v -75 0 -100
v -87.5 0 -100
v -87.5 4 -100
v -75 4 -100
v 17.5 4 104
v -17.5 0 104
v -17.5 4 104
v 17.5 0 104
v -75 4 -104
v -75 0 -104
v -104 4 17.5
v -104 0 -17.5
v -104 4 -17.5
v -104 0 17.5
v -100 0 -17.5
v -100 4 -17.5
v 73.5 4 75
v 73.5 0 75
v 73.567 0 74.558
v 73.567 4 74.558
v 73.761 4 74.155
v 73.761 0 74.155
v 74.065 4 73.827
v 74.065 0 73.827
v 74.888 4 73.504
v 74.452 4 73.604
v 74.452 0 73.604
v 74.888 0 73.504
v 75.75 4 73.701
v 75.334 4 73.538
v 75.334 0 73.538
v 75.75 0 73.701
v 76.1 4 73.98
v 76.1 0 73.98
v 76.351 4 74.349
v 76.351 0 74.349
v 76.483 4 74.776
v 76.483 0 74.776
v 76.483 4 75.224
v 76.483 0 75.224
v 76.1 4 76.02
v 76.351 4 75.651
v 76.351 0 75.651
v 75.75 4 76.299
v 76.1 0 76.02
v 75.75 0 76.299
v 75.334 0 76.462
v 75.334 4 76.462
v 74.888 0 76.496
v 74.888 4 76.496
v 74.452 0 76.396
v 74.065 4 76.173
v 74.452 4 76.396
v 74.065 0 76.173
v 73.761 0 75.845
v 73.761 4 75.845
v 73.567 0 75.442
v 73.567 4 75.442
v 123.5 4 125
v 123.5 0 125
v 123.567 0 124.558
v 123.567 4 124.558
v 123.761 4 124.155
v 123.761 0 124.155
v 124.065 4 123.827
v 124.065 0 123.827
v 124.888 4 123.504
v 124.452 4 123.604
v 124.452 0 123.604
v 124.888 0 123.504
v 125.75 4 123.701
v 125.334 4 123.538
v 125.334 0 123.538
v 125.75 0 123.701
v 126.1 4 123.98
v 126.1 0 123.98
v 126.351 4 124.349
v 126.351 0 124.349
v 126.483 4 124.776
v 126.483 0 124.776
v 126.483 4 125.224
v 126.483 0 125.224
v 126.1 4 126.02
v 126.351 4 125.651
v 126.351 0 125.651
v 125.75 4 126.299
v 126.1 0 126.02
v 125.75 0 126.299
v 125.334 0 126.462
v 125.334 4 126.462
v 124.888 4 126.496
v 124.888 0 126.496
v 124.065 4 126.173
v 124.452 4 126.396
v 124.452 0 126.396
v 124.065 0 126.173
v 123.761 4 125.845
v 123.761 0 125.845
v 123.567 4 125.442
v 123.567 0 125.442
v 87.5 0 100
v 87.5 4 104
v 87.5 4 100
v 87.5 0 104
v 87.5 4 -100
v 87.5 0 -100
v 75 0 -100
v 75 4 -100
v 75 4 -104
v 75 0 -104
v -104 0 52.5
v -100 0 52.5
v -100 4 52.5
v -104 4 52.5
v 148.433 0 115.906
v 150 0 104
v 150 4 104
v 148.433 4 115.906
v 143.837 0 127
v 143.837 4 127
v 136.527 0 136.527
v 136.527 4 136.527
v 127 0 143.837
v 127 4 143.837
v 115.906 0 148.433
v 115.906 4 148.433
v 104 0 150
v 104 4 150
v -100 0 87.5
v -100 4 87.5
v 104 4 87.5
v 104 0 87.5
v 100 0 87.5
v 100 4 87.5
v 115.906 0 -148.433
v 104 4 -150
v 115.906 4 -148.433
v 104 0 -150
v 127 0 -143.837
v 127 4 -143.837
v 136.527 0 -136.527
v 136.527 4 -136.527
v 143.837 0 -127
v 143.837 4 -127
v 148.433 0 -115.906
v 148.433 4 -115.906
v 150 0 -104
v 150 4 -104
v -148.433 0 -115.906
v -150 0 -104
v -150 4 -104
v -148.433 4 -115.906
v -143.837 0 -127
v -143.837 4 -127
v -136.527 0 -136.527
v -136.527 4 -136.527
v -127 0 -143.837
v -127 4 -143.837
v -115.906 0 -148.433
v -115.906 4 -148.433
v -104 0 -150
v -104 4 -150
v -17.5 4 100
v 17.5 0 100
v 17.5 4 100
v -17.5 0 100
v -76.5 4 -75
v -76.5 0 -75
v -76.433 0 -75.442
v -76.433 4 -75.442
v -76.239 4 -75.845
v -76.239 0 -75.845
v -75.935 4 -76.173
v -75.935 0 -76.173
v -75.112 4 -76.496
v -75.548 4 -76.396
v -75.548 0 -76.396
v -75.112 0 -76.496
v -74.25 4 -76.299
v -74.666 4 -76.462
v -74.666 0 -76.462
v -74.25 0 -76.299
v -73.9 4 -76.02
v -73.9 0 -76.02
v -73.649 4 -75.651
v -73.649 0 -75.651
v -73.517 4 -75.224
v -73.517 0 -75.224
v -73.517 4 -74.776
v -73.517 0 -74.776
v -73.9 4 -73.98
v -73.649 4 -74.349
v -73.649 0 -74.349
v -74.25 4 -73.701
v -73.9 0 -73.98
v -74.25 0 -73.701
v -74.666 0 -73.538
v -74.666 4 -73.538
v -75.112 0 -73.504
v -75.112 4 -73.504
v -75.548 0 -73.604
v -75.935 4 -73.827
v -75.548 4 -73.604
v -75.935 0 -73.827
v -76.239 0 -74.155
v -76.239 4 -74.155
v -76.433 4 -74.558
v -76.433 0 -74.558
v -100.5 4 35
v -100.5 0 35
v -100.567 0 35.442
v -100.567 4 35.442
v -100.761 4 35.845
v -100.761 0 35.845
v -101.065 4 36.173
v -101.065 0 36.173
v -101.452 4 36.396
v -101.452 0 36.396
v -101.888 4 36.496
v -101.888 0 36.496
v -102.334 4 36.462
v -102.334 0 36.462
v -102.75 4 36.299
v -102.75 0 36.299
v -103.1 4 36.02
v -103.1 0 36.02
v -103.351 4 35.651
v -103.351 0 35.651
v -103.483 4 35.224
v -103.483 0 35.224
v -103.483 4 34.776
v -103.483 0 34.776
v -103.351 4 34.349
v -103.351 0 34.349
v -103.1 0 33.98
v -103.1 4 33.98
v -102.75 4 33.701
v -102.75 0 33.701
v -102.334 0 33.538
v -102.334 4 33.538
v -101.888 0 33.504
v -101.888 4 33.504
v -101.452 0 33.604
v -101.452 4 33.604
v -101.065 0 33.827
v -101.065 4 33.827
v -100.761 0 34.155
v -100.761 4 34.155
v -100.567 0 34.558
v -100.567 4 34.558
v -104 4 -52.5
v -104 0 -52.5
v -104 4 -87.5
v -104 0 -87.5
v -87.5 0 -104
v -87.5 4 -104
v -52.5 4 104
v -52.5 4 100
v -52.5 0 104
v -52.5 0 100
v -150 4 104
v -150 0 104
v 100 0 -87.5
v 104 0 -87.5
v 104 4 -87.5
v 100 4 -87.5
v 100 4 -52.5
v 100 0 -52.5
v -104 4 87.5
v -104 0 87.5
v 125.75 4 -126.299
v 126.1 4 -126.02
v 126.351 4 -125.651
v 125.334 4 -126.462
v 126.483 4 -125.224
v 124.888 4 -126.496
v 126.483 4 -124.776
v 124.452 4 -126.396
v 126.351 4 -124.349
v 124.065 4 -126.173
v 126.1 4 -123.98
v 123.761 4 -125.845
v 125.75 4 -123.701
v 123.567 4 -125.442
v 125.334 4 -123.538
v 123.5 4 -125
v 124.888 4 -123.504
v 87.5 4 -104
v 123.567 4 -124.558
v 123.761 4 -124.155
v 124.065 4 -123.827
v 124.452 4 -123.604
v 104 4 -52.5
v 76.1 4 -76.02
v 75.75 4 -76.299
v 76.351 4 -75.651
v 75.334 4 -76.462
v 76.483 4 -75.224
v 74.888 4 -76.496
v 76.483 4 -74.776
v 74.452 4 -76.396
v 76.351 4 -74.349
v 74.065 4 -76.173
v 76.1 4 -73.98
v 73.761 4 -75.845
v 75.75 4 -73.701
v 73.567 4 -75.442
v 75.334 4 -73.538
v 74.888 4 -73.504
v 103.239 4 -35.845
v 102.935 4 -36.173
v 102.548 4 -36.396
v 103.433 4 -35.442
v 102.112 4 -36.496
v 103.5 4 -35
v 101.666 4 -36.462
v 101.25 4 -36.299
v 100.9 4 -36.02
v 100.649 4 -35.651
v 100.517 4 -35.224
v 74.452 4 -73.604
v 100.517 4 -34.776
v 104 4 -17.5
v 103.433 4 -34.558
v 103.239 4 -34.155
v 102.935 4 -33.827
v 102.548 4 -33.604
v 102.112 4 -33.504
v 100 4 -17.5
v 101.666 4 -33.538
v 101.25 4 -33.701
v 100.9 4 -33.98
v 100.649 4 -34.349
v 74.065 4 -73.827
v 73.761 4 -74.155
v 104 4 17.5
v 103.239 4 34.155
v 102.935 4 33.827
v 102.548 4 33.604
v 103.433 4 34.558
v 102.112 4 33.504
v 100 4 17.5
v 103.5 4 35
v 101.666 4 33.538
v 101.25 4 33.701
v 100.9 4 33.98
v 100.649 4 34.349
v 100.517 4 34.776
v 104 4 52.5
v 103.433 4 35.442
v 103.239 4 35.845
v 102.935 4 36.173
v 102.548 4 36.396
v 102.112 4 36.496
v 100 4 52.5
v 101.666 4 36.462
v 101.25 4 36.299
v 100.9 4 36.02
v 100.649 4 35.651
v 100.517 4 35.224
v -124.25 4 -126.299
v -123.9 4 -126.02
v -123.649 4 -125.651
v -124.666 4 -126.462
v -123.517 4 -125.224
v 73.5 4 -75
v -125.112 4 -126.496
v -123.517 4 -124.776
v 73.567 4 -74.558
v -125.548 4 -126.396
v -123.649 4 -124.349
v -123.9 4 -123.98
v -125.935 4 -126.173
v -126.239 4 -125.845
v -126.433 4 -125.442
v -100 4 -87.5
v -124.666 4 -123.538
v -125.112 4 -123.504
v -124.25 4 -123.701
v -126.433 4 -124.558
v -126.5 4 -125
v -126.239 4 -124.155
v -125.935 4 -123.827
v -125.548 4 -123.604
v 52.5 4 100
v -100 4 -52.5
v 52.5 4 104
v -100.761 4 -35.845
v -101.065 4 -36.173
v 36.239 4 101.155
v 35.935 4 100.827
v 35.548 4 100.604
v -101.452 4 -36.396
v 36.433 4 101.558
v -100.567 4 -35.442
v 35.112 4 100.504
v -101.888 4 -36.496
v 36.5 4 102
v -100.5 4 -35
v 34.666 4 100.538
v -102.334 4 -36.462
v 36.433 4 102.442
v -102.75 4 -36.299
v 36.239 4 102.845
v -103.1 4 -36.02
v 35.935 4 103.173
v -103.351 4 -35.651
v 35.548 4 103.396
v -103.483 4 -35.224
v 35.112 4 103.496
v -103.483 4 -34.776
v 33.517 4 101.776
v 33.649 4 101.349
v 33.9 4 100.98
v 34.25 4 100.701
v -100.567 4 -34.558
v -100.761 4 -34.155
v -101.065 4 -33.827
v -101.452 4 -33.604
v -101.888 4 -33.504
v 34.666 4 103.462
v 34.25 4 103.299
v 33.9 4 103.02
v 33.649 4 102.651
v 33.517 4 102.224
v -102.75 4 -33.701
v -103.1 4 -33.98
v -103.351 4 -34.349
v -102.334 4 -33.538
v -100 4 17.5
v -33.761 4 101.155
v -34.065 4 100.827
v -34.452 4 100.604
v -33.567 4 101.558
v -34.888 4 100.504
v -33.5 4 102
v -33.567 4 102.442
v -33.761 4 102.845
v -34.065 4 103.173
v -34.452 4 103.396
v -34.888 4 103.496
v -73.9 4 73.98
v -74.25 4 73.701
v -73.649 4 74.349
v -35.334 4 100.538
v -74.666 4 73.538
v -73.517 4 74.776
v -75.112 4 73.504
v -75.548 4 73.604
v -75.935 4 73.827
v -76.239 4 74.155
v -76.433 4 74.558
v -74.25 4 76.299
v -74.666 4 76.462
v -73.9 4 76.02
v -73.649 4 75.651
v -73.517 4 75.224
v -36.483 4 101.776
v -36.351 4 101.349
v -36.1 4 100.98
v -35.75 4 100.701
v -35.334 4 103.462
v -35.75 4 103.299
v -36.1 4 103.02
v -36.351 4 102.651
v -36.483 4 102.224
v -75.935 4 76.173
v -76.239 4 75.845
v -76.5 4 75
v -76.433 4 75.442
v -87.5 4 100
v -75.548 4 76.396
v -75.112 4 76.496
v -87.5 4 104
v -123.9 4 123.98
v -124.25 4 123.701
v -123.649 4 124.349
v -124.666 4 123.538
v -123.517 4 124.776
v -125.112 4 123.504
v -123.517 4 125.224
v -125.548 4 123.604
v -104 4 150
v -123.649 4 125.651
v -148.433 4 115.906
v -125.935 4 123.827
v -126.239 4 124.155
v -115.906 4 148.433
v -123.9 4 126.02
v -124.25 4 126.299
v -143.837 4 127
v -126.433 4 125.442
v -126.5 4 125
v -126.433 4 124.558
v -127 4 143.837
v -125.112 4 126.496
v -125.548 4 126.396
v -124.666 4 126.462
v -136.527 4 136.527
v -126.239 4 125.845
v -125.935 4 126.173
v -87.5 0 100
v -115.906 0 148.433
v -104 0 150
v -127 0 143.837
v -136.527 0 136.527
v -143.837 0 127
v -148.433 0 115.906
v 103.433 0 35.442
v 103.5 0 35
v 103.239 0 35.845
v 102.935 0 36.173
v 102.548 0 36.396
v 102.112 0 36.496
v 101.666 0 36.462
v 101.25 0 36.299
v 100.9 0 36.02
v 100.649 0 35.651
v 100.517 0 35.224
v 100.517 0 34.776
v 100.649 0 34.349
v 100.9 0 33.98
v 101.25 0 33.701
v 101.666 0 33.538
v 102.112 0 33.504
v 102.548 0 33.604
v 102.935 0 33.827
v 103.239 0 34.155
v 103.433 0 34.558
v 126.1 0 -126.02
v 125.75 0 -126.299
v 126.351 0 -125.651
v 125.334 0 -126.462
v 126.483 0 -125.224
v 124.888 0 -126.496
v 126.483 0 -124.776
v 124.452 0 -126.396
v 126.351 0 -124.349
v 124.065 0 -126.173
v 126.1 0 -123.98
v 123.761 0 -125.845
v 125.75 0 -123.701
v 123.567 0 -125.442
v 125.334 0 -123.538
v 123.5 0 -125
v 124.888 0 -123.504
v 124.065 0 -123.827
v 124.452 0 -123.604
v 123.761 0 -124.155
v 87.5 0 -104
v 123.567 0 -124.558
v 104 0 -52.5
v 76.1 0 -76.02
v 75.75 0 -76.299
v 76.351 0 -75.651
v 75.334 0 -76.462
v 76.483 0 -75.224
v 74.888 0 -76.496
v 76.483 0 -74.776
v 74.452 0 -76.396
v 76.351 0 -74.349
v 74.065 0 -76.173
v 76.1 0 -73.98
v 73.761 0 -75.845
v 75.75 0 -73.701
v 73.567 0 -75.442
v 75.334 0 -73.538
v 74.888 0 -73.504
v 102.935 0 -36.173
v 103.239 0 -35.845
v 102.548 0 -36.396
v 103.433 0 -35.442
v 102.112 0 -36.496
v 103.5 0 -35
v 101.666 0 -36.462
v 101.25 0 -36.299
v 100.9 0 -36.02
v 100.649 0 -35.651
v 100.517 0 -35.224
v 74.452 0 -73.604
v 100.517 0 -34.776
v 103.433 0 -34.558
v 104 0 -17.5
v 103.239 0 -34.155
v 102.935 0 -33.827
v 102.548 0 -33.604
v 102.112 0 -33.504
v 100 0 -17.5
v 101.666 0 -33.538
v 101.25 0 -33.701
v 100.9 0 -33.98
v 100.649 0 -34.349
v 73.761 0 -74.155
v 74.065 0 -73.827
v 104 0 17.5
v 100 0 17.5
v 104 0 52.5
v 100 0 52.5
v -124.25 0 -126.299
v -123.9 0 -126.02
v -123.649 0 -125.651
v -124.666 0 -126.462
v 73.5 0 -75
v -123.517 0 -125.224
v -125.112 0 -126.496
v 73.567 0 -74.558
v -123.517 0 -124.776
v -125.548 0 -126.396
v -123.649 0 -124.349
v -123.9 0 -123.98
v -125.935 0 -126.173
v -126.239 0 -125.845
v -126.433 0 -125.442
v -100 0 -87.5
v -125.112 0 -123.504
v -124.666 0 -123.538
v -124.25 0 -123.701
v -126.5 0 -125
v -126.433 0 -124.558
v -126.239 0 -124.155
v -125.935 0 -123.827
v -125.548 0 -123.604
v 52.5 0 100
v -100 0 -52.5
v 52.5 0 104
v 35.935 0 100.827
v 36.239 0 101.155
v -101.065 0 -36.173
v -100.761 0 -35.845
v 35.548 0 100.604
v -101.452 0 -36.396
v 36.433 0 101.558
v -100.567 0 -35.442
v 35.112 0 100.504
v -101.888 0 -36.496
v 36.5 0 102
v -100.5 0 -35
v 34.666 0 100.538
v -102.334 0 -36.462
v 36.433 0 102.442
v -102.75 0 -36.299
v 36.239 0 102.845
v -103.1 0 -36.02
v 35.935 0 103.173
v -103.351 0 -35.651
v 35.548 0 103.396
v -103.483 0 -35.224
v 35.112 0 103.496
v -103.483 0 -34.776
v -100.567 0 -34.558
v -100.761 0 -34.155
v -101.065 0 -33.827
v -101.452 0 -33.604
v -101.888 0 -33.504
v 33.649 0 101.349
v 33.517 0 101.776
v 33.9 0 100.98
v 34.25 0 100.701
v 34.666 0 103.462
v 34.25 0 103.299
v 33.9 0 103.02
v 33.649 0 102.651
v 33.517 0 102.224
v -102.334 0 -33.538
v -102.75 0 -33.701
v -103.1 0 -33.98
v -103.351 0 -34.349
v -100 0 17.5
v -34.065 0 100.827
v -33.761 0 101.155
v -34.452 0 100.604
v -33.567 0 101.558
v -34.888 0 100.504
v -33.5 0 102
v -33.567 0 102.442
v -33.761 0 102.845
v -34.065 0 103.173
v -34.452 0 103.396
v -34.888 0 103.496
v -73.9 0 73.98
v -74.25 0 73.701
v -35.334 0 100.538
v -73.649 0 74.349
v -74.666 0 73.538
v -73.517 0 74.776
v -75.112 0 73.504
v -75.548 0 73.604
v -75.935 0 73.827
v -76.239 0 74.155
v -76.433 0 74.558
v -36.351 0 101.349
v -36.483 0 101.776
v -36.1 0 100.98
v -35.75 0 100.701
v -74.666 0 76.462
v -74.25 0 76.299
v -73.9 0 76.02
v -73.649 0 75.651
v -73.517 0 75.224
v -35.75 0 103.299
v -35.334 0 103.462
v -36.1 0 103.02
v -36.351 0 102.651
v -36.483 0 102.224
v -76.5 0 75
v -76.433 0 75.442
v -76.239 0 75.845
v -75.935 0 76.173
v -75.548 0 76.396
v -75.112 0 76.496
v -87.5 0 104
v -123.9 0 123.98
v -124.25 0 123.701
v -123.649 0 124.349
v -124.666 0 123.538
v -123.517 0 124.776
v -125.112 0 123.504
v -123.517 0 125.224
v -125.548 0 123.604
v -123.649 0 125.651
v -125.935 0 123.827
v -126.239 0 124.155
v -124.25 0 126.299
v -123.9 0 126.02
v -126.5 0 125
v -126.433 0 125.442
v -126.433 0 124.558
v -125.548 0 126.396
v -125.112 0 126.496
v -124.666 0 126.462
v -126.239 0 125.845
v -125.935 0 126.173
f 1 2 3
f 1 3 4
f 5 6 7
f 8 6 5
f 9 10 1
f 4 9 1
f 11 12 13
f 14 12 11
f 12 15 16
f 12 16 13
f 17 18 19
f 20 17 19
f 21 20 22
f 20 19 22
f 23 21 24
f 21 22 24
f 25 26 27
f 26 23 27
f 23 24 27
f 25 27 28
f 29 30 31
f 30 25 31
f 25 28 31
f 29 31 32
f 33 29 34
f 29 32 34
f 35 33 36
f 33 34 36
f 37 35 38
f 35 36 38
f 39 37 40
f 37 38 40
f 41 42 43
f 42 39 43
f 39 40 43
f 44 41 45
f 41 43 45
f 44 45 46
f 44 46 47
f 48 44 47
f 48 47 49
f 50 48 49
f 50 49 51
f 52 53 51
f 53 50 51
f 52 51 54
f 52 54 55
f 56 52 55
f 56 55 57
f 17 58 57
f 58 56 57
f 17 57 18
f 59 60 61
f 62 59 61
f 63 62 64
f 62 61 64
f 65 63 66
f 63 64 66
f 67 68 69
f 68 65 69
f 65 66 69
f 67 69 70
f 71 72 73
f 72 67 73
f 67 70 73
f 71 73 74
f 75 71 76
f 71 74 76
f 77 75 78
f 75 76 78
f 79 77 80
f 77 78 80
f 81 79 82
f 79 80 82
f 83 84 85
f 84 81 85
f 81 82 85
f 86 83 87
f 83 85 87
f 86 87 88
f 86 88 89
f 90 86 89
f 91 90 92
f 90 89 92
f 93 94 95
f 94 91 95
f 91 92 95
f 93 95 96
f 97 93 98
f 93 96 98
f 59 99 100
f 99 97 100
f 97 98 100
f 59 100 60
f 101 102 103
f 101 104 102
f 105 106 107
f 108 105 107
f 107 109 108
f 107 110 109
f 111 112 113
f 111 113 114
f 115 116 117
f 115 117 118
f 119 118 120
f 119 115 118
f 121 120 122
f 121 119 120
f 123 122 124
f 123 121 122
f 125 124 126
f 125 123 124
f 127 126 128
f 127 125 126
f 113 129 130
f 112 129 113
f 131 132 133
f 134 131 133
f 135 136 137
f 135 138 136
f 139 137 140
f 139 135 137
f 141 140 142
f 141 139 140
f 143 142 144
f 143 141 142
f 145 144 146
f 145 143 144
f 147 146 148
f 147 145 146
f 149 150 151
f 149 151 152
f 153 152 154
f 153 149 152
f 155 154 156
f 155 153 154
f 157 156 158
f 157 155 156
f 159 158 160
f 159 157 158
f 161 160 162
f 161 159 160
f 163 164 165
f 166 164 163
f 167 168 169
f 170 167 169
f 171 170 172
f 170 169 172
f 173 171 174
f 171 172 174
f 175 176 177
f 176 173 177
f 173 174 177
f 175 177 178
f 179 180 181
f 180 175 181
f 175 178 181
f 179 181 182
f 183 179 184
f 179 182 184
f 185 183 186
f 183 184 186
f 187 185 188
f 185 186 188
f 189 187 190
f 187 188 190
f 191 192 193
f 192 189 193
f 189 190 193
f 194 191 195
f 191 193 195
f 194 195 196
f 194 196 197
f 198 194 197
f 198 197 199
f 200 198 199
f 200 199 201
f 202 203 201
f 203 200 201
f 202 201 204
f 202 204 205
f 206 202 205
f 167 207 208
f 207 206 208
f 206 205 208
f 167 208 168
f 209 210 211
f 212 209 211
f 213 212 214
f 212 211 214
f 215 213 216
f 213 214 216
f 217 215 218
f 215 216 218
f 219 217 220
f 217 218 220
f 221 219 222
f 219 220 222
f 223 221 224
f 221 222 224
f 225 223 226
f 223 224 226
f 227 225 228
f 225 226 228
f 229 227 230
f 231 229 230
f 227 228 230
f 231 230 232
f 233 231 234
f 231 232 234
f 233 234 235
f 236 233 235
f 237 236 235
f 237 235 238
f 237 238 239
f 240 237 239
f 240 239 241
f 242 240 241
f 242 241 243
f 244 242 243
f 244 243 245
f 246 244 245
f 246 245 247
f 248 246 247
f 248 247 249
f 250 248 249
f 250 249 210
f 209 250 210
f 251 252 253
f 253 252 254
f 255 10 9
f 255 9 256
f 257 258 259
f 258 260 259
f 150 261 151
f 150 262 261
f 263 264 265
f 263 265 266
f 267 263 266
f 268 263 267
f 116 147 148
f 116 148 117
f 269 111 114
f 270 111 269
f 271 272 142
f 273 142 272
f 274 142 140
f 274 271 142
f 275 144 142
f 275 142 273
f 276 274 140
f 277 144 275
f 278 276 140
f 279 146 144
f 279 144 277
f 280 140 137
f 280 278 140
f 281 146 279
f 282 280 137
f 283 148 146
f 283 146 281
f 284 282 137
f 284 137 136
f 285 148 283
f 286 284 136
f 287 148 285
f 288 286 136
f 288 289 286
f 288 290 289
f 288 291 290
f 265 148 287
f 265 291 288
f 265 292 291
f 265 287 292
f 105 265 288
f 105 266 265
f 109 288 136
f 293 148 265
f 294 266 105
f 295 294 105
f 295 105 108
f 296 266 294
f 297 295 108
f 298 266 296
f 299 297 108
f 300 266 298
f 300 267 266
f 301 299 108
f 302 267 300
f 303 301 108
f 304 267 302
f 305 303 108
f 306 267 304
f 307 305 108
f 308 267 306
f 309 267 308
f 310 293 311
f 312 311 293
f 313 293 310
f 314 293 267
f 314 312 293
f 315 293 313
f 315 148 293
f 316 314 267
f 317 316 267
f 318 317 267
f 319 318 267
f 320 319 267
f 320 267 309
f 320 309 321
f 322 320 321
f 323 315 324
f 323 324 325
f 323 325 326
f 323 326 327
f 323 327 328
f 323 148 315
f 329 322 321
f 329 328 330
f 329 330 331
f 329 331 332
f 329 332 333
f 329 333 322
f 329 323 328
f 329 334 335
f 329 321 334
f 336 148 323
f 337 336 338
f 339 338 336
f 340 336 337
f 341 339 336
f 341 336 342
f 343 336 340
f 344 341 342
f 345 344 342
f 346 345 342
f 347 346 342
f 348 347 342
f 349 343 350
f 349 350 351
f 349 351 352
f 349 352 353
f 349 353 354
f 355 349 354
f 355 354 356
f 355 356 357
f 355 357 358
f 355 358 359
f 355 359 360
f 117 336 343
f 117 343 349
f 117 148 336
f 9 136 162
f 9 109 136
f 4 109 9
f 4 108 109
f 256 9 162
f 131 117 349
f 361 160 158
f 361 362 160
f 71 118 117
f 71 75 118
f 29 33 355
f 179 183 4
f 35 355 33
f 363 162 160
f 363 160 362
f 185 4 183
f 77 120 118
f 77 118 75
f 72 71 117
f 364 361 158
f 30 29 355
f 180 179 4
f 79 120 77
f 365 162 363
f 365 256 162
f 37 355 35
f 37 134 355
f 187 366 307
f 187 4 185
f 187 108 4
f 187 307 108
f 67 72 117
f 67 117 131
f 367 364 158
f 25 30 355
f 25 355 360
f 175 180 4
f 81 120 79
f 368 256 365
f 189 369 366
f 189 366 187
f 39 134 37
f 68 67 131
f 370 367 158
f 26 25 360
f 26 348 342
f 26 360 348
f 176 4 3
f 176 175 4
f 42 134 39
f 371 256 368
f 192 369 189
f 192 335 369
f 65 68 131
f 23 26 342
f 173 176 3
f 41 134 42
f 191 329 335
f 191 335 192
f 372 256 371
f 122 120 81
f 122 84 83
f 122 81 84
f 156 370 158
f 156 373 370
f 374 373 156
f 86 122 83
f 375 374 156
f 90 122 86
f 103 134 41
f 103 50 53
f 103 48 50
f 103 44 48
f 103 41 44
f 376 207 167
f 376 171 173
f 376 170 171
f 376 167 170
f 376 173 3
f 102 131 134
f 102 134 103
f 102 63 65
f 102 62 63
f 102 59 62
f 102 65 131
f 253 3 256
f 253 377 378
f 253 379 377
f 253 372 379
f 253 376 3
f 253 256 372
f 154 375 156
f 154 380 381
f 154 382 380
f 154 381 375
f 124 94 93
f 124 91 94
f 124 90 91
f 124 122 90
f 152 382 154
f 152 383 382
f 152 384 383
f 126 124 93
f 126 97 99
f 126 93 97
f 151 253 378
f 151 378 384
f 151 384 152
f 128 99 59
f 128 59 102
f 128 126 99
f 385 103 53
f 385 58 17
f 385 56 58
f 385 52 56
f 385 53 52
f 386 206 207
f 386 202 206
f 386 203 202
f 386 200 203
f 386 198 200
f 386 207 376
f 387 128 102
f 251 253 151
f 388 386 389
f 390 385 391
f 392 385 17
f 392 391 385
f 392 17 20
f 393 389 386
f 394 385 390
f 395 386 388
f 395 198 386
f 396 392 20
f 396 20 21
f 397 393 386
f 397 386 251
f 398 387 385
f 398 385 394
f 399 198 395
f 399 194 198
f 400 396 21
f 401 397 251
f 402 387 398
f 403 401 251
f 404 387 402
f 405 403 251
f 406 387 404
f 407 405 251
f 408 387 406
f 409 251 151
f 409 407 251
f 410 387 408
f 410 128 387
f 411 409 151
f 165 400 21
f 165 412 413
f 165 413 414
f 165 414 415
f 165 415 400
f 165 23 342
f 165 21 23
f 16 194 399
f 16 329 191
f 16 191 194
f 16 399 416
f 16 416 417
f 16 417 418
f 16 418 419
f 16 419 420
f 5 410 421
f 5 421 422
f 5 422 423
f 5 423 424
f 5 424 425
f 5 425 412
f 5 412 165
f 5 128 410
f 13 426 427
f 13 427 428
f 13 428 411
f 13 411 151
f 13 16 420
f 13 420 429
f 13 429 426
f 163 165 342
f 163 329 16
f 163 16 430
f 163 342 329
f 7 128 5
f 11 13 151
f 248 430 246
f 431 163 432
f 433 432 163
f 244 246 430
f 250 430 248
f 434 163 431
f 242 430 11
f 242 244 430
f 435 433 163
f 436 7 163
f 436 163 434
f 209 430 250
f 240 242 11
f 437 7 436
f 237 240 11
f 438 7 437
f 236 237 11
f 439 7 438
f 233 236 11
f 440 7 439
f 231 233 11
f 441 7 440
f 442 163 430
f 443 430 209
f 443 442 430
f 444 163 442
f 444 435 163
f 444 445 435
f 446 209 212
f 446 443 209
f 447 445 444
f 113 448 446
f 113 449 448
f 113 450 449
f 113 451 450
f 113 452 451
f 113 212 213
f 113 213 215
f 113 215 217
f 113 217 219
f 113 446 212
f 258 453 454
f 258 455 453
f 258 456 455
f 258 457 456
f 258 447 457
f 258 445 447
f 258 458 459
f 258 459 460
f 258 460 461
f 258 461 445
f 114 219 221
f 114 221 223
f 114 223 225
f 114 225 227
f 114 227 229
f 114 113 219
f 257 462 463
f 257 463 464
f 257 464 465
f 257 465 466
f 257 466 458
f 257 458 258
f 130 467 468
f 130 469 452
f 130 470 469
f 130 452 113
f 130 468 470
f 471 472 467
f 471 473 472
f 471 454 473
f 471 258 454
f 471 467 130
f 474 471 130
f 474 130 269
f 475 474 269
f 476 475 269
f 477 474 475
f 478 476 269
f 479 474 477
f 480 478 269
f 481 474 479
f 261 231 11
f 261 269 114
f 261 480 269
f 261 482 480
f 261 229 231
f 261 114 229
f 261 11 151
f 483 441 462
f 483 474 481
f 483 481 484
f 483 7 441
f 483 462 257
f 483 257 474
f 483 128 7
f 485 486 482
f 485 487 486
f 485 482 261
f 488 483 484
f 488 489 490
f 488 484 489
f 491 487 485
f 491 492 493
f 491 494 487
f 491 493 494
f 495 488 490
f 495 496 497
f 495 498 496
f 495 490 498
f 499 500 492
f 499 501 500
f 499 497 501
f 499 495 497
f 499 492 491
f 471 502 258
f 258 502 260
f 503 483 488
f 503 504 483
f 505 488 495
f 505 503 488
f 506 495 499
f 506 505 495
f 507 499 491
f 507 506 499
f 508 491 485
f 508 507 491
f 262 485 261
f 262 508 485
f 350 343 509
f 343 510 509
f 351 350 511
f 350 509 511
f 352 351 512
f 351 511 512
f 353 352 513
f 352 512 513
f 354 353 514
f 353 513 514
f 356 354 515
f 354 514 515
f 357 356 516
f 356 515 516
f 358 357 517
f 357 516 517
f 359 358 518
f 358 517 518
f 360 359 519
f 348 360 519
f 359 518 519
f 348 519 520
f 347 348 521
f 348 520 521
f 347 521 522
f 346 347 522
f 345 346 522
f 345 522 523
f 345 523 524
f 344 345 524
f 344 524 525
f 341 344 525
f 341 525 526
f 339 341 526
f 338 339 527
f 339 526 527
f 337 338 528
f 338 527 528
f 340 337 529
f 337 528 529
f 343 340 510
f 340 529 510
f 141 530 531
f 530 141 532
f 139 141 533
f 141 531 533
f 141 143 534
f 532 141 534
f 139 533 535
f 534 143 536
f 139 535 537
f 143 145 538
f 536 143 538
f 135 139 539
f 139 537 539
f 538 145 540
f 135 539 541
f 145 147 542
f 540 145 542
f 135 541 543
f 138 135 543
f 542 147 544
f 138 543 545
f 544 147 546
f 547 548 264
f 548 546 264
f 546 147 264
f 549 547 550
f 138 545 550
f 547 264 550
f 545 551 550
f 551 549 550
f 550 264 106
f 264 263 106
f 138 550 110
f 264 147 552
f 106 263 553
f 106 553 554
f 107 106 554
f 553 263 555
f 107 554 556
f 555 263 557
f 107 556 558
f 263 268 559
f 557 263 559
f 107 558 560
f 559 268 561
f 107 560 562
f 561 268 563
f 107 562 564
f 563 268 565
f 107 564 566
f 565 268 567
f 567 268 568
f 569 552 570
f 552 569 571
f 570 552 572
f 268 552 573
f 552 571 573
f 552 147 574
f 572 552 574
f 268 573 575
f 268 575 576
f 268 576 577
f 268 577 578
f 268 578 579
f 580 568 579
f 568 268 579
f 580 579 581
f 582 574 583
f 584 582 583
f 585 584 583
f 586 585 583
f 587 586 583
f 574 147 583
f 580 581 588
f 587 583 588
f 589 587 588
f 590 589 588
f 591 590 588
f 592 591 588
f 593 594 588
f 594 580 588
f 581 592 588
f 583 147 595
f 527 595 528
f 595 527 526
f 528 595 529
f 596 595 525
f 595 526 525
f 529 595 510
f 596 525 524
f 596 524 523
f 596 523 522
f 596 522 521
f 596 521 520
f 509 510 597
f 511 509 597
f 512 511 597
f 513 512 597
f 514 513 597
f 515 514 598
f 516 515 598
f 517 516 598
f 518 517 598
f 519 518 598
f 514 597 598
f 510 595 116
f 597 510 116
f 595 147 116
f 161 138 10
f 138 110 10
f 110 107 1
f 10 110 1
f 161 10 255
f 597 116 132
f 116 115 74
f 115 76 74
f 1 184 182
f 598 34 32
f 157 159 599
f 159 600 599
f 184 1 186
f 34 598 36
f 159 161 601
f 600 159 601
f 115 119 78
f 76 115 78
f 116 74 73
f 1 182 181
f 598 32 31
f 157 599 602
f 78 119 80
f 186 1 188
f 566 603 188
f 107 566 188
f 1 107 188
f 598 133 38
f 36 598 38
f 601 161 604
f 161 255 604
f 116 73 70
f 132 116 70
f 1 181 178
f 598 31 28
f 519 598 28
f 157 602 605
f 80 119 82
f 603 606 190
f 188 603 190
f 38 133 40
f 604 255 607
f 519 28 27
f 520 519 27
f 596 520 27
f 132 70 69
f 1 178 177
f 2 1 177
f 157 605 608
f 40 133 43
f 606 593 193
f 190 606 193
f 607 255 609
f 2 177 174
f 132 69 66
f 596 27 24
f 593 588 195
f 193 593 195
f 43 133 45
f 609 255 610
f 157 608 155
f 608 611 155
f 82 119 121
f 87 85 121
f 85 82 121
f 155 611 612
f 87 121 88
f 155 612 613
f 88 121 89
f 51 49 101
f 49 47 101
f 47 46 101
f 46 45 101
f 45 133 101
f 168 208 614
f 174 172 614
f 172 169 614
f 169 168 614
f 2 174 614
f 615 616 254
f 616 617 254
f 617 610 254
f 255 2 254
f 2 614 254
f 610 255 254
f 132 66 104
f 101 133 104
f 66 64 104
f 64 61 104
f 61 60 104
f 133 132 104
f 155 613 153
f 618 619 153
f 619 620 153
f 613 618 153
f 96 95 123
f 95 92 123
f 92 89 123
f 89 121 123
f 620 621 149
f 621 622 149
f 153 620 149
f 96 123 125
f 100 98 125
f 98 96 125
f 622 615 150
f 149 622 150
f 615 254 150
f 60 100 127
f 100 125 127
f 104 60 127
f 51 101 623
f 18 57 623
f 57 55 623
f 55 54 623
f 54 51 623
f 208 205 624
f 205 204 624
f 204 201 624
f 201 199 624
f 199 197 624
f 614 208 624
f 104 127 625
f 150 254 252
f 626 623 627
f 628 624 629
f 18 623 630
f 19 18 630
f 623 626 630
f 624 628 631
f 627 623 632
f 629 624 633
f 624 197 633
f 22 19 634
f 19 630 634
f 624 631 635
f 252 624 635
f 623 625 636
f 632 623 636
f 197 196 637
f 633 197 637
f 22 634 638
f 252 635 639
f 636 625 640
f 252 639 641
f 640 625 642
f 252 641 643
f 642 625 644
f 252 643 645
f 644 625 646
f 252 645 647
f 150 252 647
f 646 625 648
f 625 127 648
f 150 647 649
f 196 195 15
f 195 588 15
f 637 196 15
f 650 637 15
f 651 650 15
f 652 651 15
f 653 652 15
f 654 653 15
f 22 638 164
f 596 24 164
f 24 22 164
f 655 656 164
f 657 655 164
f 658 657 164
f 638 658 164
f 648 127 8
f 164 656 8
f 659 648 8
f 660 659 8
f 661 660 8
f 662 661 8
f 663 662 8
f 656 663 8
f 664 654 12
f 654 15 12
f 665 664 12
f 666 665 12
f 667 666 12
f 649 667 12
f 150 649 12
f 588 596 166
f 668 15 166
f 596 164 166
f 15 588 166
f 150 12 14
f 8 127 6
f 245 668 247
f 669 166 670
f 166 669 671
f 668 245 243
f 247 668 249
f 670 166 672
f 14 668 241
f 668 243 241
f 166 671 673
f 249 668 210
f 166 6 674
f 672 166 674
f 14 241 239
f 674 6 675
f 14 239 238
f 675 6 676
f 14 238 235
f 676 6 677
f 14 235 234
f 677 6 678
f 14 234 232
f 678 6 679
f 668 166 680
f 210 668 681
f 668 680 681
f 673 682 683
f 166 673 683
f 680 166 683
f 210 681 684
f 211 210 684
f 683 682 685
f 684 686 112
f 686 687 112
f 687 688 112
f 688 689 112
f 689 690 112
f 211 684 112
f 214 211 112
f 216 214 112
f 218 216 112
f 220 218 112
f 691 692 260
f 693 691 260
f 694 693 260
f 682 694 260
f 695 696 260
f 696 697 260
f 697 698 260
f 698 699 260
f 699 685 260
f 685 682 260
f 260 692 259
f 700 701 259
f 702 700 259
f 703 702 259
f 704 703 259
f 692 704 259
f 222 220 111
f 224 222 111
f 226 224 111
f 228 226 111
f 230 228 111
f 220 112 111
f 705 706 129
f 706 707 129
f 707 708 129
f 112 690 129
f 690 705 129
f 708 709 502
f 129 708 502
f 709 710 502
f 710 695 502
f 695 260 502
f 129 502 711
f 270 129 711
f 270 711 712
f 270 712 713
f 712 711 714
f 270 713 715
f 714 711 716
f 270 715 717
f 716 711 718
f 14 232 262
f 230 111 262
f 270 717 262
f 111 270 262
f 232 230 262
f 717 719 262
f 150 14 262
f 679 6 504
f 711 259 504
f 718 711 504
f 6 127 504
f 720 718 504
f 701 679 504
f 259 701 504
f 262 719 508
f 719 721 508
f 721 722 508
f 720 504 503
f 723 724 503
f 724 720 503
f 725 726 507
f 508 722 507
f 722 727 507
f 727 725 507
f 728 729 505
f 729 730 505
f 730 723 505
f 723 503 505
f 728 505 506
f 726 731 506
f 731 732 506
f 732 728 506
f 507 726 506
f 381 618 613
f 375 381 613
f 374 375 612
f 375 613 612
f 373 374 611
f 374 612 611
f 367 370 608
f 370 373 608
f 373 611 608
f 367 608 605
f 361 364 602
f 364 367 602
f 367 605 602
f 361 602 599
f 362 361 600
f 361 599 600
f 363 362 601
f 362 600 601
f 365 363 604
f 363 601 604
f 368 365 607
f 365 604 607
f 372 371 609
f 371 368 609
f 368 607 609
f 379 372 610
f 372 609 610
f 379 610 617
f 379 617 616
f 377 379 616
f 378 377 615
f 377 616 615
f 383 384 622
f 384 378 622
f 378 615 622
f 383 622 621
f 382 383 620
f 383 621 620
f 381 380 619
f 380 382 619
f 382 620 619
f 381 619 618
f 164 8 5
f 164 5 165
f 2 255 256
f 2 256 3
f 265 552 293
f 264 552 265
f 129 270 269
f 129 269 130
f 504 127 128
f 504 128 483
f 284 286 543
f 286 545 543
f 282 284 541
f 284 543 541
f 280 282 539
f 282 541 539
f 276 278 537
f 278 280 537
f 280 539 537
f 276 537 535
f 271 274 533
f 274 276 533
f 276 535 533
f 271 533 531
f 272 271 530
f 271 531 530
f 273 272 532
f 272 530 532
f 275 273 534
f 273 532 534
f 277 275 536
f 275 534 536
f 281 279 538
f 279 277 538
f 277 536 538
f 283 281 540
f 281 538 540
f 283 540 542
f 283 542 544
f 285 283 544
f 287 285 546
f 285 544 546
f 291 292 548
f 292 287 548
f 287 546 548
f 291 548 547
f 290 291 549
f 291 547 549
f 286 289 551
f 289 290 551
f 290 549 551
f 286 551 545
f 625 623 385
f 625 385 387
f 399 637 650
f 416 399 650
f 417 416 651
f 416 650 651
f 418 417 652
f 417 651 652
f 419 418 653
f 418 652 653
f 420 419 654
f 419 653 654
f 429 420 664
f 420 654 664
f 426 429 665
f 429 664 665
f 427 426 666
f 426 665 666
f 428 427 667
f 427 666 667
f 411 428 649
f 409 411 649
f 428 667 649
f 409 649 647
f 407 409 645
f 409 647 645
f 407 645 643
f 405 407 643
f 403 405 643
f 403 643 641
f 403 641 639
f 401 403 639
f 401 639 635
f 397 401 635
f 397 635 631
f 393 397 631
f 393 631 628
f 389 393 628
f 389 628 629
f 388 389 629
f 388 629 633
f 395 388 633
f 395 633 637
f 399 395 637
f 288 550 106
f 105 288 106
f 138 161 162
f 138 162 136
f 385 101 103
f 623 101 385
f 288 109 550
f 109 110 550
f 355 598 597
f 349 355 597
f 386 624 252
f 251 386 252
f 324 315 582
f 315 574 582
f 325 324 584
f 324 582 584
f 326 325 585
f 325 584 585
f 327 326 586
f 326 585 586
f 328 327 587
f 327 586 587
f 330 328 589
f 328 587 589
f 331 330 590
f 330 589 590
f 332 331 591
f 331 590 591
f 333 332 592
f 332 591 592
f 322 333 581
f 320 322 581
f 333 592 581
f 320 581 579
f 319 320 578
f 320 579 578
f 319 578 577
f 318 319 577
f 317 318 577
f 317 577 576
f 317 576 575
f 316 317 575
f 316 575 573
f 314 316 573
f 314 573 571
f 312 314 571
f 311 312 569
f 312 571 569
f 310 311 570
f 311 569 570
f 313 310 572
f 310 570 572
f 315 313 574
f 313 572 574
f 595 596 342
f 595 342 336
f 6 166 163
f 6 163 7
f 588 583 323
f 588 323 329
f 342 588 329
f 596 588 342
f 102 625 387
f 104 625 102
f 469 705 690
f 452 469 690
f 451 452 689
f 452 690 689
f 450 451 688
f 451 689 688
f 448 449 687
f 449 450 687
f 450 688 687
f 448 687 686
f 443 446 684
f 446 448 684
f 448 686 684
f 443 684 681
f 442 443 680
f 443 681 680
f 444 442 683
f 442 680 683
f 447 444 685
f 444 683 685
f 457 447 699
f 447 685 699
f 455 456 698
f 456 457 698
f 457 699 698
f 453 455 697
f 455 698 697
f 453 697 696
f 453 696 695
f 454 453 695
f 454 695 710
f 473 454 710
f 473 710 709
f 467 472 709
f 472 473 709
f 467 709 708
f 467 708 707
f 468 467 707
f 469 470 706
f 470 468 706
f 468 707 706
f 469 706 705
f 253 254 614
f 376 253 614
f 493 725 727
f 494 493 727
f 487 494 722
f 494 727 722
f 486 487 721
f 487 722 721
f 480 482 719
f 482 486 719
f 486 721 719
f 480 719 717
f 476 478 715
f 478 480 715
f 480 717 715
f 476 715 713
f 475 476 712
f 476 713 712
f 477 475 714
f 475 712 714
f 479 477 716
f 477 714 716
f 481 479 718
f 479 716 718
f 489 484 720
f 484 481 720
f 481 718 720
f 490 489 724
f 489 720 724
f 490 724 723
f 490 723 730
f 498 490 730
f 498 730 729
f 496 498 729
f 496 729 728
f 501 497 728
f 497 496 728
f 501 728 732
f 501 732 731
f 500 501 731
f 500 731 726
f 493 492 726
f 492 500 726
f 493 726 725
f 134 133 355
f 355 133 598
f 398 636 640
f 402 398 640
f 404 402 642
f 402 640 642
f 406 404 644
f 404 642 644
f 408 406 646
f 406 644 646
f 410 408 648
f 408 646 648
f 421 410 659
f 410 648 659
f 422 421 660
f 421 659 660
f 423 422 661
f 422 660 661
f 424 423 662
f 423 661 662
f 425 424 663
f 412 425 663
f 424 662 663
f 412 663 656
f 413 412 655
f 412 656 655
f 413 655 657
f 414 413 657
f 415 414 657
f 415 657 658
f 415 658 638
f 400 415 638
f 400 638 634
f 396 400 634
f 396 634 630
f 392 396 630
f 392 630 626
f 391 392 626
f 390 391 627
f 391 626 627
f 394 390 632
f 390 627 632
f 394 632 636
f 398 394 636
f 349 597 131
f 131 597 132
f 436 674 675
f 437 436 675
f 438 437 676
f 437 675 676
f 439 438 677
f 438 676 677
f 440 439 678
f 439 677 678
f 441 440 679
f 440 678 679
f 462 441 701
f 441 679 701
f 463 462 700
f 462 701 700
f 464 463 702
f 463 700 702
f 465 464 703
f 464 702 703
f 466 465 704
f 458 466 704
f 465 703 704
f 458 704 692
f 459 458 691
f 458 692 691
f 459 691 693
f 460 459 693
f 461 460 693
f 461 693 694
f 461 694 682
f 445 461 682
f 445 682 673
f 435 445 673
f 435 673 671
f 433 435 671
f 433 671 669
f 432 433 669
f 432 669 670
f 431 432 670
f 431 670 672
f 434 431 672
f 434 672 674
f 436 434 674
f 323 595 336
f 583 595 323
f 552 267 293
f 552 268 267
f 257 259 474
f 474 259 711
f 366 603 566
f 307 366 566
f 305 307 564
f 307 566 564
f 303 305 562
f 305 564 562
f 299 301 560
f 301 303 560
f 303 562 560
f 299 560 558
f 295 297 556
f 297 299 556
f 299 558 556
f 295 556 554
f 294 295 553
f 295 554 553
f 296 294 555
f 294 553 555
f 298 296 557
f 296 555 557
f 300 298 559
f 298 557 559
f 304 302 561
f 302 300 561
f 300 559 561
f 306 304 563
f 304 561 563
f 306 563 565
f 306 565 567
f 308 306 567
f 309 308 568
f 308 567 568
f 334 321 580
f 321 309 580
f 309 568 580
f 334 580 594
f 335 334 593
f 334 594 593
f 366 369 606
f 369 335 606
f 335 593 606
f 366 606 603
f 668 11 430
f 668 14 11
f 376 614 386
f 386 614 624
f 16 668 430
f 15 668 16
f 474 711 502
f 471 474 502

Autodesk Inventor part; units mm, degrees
ref_plane "YZ Plane" through (0, 0, 0) normal (1, 0, 0) x (0, 1, 0)
ref_plane "XZ Plane" through (0, 0, 0) normal (0, 1, 0) x (-1, 0, 0)
ref_plane "XY Plane" through (0, 0, 0) normal (0, 0, 1) x (1, 0, 0)
sketch "Sketch1" plane through (0, 0, 0) normal (0, 1, 0) x (-1, 0, 0)
  line L0 (-104, 150) -> (104, 150)
  line L1 (150, 104) -> (150, -104)
  line L2 (104, -150) -> (-104, -150)
  line L3 (-150, -104) -> (-150, 104)
  line L4 (-150, 150) -> (150, -150) construction
  line L5 (150, 150) -> (-150, -150) construction
  line L6 (-100, 100) -> (100, 100) construction
  line L7 (100, 100) -> (100, -100) construction
  line L8 (100, -100) -> (-100, -100) construction
  line L9 (-100, -100) -> (-100, 100) construction
  line L10 (-100, 100) -> (100, -100) construction
  line L11 (100, 100) -> (-100, -100) construction
  line L12 (-125, 125) -> (125, 125) construction
  line L13 (125, 125) -> (125, -125) construction
  line L14 (125, -125) -> (-125, -125) construction
  line L15 (-125, -125) -> (-125, 125) construction
  line L16 (-125, 125) -> (125, -125) construction
  line L17 (125, 125) -> (-125, -125) construction
  line L18 (-75, 75) -> (75, 75) construction
  line L19 (75, 75) -> (75, -75) construction
  line L20 (75, -75) -> (-75, -75) construction
  line L21 (-75, -75) -> (-75, 75) construction
  line L22 (-75, 75) -> (75, -75) construction
  line L23 (75, 75) -> (-75, -75) construction
  line L24 (-104, -104) -> (104, -104) construction
  line L25 (104, -104) -> (104, 104) construction
  line L26 (104, 104) -> (-104, 104) construction
  line L27 (-104, 104) -> (-104, -104) construction
  circle A0 centre (125, -125) radius 1.5
  circle A1 centre (75, -75) radius 1.5
  circle A2 centre (75, 75) radius 1.5
  circle A3 centre (125, 125) radius 1.5
  circle A4 centre (-75, 75) radius 1.5
  circle A5 centre (-125, 125) radius 1.5
  circle A6 centre (-75, -75) radius 1.5
  circle A7 centre (-125, -125) radius 1.5
  line L28 (17.5, -100) -> (-17.5, -100)
  line L29 (-17.5, -100) -> (-17.5, -104)
  line L30 (-17.5, -104) -> (17.5, -104)
  line L31 (17.5, -104) -> (17.5, -100)
  arc A8 (104, -150) -> (150, -104) centre (104, -104) ccw
  arc A9 (150, 104) -> (104, 150) centre (104, 104) ccw
  arc A10 (-150, -104) -> (-104, -150) centre (-104, -104) ccw
  arc A11 (-104, 150) -> (-150, 104) centre (-104, 104) ccw
  line L32 (87.5, -100) -> (52.5, -100)
  line L33 (52.5, -100) -> (52.5, -104)
  line L34 (52.5, -104) -> (87.5, -104)
  line L35 (87.5, -104) -> (87.5, -100)
  line L36 (-87.5, -100) -> (-52.5, -100)
  line L37 (-52.5, -100) -> (-52.5, -104)
  line L38 (-52.5, -104) -> (-87.5, -104)
  line L39 (-87.5, -104) -> (-87.5, -100)
  line L40 (52.5, -104) -> (17.5, -100) construction
  line L41 (-17.5, -100) -> (-52.5, -104) construction
  line L42 (100, 17.5) -> (100, -17.5)
  line L43 (104, -17.5) -> (104, 17.5)
  line L44 (104, 17.5) -> (100, 17.5)
  line L45 (100, 52.5) -> (104, 52.5)
  line L46 (100, 87.5) -> (100, 52.5)
  line L47 (104, 87.5) -> (100, 87.5)
  line L48 (104, 52.5) -> (104, 87.5)
  line L49 (104, 52.5) -> (100, 17.5) construction
  line L50 (100, -17.5) -> (104, -17.5)
  line L51 (100, -17.5) -> (104, -52.5) construction
  line L52 (100, -52.5) -> (104, -52.5)
  line L53 (104, -87.5) -> (100, -87.5)
  line L54 (104, -52.5) -> (104, -87.5)
  line L55 (100, -87.5) -> (100, -52.5)
  line L56 (-17.5, 100) -> (17.5, 100)
  line L57 (17.5, 104) -> (-17.5, 104)
  line L58 (-17.5, 104) -> (-17.5, 100)
  line L59 (-52.5, 100) -> (-52.5, 104)
  line L60 (-87.5, 100) -> (-52.5, 100)
  line L61 (-87.5, 104) -> (-87.5, 100)
  line L62 (-52.5, 104) -> (-87.5, 104)
  line L63 (-52.5, 104) -> (-17.5, 100) construction
  line L64 (17.5, 100) -> (17.5, 104)
  line L65 (17.5, 100) -> (52.5, 104) construction
  line L66 (52.5, 100) -> (52.5, 104)
  line L67 (87.5, 104) -> (87.5, 100)
  line L68 (52.5, 104) -> (87.5, 104)
  line L69 (87.5, 100) -> (52.5, 100)
  line L70 (-100, -17.5) -> (-100, 17.5)
  line L71 (-104, 17.5) -> (-104, -17.5)
  line L72 (-104, -17.5) -> (-100, -17.5)
  line L73 (-100, -52.5) -> (-104, -52.5)
  line L74 (-100, -87.5) -> (-100, -52.5)
  line L75 (-104, -87.5) -> (-100, -87.5)
  line L76 (-104, -52.5) -> (-104, -87.5)
  line L77 (-104, -52.5) -> (-100, -17.5) construction
  line L78 (-100, 17.5) -> (-104, 17.5)
  line L79 (-100, 17.5) -> (-104, 52.5) construction
  line L80 (-100, 52.5) -> (-104, 52.5)
  line L81 (-104, 87.5) -> (-100, 87.5)
  line L82 (-104, 52.5) -> (-104, 87.5)
  line L83 (-100, 87.5) -> (-100, 52.5)
  point P0 (0, 0)
  point P1 (0, -100)
  point P2 (87.5, -102)
  point P3 (100, 0)
  point P4 (102, 87.5)
  point P5 (0, 100)
  point P6 (-87.5, 102)
  point P7 (-100, 0)
  point P8 (-102, -87.5)
  dimension "d0" = 300
  dimension "d1" = 300
  dimension "d2" = 200
  dimension "d3" = 200
  dimension "d4" = 4
  dimension "d5" = 25
  dimension "d6" = 25
  dimension "d7" = 3
  dimension "d8" = 3
  dimension "d11" = 360
  dimension "d16" = 4
  dimension "d24" = 46
  dimension "d25" = 46
  dimension "d31" = 35
  dimension "d32" = 35
  dimension "d35" = 360
extrude "Extrusion1" add sketch "Sketch1" along normal blind 4
sketch "Sketch3" plane through (0, 0, 0) normal (0, -1, 0) x (1, 0, 0)
  circle A0 centre (-35, 102) radius 1.5
  circle A1 centre (35, 102) radius 1.5
  line L0 (-52.5, 104) -> (-17.5, 100) construction
  line L1 (17.5, 100) -> (52.5, 104) construction
  circle A2 centre (-102, -35) radius 1.5
  circle A3 centre (-102, 35) radius 1.5
  circle A4 centre (35, -102) radius 1.5
  circle A5 centre (-35, -102) radius 1.5
  circle A6 centre (102, 35) radius 1.5
  circle A7 centre (102, -35) radius 1.5
  point P0 (0, 0)
  dimension "d44" = 3
  dimension "d45" = 3
  dimension "d48" = 360
extrude "Extrusion2" cut sketch "Sketch3" against normal up to next
sketch "Sketch4" plane through (0, 0, 0) normal (0, -1, 0) x (1, 0, 0)
  line L0 (87.5, -100) -> (-87.5, -100)
  line L1 (-87.5, -100) -> (-87.5, -104)
  line L2 (-87.5, -104) -> (-75, -104)
  line L3 (-75, -104) -> (-75, -135)
  line L4 (-75, -135) -> (75, -135)
  line L5 (75, -135) -> (75, -104)
  line L6 (75, -104) -> (87.5, -104)
  line L7 (87.5, -104) -> (87.5, -100)
  circle A0 centre (102, 35) radius 1.5
  circle A1 centre (-102, -35) radius 1.5
  circle A2 centre (-35, 102) radius 1.5
  circle A3 centre (102, -35) radius 1.5
  circle A4 centre (-102, 35) radius 1.5
  circle A5 centre (35, 102) radius 1.5
  circle A6 centre (125, -125) radius 1.5
  circle A7 centre (125, 125) radius 1.5
  circle A8 centre (-125, 125) radius 1.5
  circle A9 centre (-125, -125) radius 1.5
  line L8 (100, 17.5) -> (100, -17.5)
  line L9 (100, -17.5) -> (104, -17.5)
  line L10 (104, -17.5) -> (104, 17.5)
  line L11 (104, 17.5) -> (100, 17.5)
  line L12 (100, 52.5) -> (104, 52.5)
  line L13 (104, 52.5) -> (104, 87.5)
  line L14 (104, 87.5) -> (100, 87.5)
  line L15 (100, 87.5) -> (100, 52.5)
  line L16 (100, -52.5) -> (100, -87.5)
  line L17 (100, -87.5) -> (104, -87.5)
  line L18 (104, -87.5) -> (104, -52.5)
  line L19 (104, -52.5) -> (100, -52.5)
  line L20 (-17.5, 100) -> (17.5, 100)
  line L21 (17.5, 100) -> (17.5, 104)
  line L22 (17.5, 104) -> (-17.5, 104)
  line L23 (-17.5, 104) -> (-17.5, 100)
  line L24 (-52.5, 100) -> (-52.5, 104)
  line L25 (-52.5, 104) -> (-87.5, 104)
  line L26 (-87.5, 104) -> (-87.5, 100)
  line L27 (-87.5, 100) -> (-52.5, 100)
  line L28 (52.5, 100) -> (87.5, 100)
  line L29 (87.5, 100) -> (87.5, 104)
  line L30 (87.5, 104) -> (52.5, 104)
  line L31 (52.5, 104) -> (52.5, 100)
  line L32 (-100, -17.5) -> (-100, 17.5)
  line L33 (-100, 17.5) -> (-104, 17.5)
  line L34 (-104, 17.5) -> (-104, -17.5)
  line L35 (-104, -17.5) -> (-100, -17.5)
  line L36 (-100, -52.5) -> (-104, -52.5)
  line L37 (-104, -52.5) -> (-104, -87.5)
  line L38 (-104, -87.5) -> (-100, -87.5)
  line L39 (-100, -87.5) -> (-100, -52.5)
  line L40 (-100, 52.5) -> (-100, 87.5)
  line L41 (-100, 87.5) -> (-104, 87.5)
  line L42 (-104, 87.5) -> (-104, 52.5)
  line L43 (-104, 52.5) -> (-100, 52.5)
  circle A10 centre (-75, -75) radius 1.5
  circle A11 centre (-75, 75) radius 1.5
  circle A12 centre (75, 75) radius 1.5
  circle A13 centre (75, -75) radius 1.5
  arc A14 (-150, -104) -> (-104, -150) centre (-104, -104) ccw
  line L44 (-150, -104) -> (-150, 104)
  arc A15 (-104, 150) -> (-150, 104) centre (-104, 104) ccw
  line L45 (-104, 150) -> (104, 150)
  arc A16 (150, 104) -> (104, 150) centre (104, 104) ccw
  line L46 (150, 104) -> (150, -104)
  arc A17 (104, -150) -> (150, -104) centre (104, -104) ccw
  line L47 (104, -150) -> (-104, -150)
  circle A18 centre (-102, 35) radius 1.5 projected
  circle A19 centre (102, -35) radius 1.5 projected
  circle A20 centre (35, -102) radius 1.5 projected
  circle A21 centre (35, 102) radius 1.5 projected
  circle A22 centre (-102, -35) radius 1.5 projected
  circle A23 centre (102, 35) radius 1.5 projected
  circle A24 centre (-35, -102) radius 1.5 projected
  circle A25 centre (-35, 102) radius 1.5 projected
  circle A26 centre (-125, -125) radius 1.5 projected
  circle A27 centre (-125, 125) radius 1.5 projected
  circle A28 centre (125, 125) radius 1.5 projected
  circle A29 centre (125, -125) radius 1.5 projected
  line L48 (17.5, -100) -> (-17.5, -100) projected
  line L49 (-17.5, -100) -> (-17.5, -104) projected
  line L50 (-17.5, -104) -> (17.5, -104) projected
  line L51 (17.5, -104) -> (17.5, -100) projected
  line L52 (-52.5, -100) -> (-87.5, -100) projected
  line L53 (-87.5, -100) -> (-87.5, -104) projected
  line L54 (-87.5, -104) -> (-52.5, -104) projected
  line L55 (-52.5, -104) -> (-52.5, -100) projected
  line L56 (87.5, -104) -> (87.5, -100) projected
  line L57 (87.5, -100) -> (52.5, -100) projected
  line L58 (52.5, -100) -> (52.5, -104) projected
  line L59 (52.5, -104) -> (87.5, -104) projected
  line L60 (-100, -17.5) -> (-100, 17.5) projected
  line L61 (-100, 17.5) -> (-104, 17.5) projected
  line L62 (-104, 17.5) -> (-104, -17.5) projected
  line L63 (-104, -17.5) -> (-100, -17.5) projected
  line L64 (-104, 52.5) -> (-100, 52.5) projected
  line L65 (-100, 52.5) -> (-100, 87.5) projected
  line L66 (-100, 87.5) -> (-104, 87.5) projected
  line L67 (-104, 87.5) -> (-104, 52.5) projected
  line L68 (-100, -87.5) -> (-100, -52.5) projected
  line L69 (-100, -52.5) -> (-104, -52.5) projected
  line L70 (-104, -52.5) -> (-104, -87.5) projected
  line L71 (-104, -87.5) -> (-100, -87.5) projected
  line L72 (-17.5, 100) -> (17.5, 100) projected
  line L73 (17.5, 100) -> (17.5, 104) projected
  line L74 (17.5, 104) -> (-17.5, 104) projected
  line L75 (-17.5, 104) -> (-17.5, 100) projected
  line L76 (52.5, 104) -> (52.5, 100) projected
  line L77 (52.5, 100) -> (87.5, 100) projected
  line L78 (87.5, 100) -> (87.5, 104) projected
  line L79 (87.5, 104) -> (52.5, 104) projected
  line L80 (-87.5, 100) -> (-52.5, 100) projected
  line L81 (-52.5, 100) -> (-52.5, 104) projected
  line L82 (-52.5, 104) -> (-87.5, 104) projected
  line L83 (-87.5, 104) -> (-87.5, 100) projected
  line L84 (100, 17.5) -> (100, -17.5) projected
  line L85 (100, -17.5) -> (104, -17.5) projected
  line L86 (104, -17.5) -> (104, 17.5) projected
  line L87 (104, 17.5) -> (100, 17.5) projected
  line L88 (104, -52.5) -> (100, -52.5) projected
  line L89 (100, -52.5) -> (100, -87.5) projected
  line L90 (100, -87.5) -> (104, -87.5) projected
  line L91 (104, -87.5) -> (104, -52.5) projected
  line L92 (100, 87.5) -> (100, 52.5) projected
  line L93 (100, 52.5) -> (104, 52.5) projected
  line L94 (104, 52.5) -> (104, 87.5) projected
  line L95 (104, 87.5) -> (100, 87.5) projected
  circle A30 centre (75, -75) radius 1.5 projected
  circle A31 centre (75, 75) radius 1.5 projected
  circle A32 centre (-75, 75) radius 1.5 projected
  circle A33 centre (-75, -75) radius 1.5 projected
  arc A34 (104, -150) -> (150, -104) centre (104, -104) ccw projected
  line L96 (104, -150) -> (-104, -150) projected
  arc A35 (-150, -104) -> (-104, -150) centre (-104, -104) ccw projected
  line L97 (-150, -104) -> (-150, 104) projected
  arc A36 (-104, 150) -> (-150, 104) centre (-104, 104) ccw projected
  line L98 (-104, 150) -> (104, 150) projected
  arc A37 (150, 104) -> (104, 150) centre (104, 104) ccw projected
  line L99 (150, 104) -> (150, -104) projected
  line L100 (-75, -104) -> (-75, -100)
  line L101 (75, -104) -> (75, -100)
  point P0 (0, 0)
extrude "Extrusion3" add sketch "Sketch4" against normal up to surface (4 mm away) contours L101 L59 L58 L0 | L51 L50 L49 L0 | L55 L54 L100 L0 | A20 | A24
properties part number "Baseplate" material "MDF Medium Density Fiberboard"
